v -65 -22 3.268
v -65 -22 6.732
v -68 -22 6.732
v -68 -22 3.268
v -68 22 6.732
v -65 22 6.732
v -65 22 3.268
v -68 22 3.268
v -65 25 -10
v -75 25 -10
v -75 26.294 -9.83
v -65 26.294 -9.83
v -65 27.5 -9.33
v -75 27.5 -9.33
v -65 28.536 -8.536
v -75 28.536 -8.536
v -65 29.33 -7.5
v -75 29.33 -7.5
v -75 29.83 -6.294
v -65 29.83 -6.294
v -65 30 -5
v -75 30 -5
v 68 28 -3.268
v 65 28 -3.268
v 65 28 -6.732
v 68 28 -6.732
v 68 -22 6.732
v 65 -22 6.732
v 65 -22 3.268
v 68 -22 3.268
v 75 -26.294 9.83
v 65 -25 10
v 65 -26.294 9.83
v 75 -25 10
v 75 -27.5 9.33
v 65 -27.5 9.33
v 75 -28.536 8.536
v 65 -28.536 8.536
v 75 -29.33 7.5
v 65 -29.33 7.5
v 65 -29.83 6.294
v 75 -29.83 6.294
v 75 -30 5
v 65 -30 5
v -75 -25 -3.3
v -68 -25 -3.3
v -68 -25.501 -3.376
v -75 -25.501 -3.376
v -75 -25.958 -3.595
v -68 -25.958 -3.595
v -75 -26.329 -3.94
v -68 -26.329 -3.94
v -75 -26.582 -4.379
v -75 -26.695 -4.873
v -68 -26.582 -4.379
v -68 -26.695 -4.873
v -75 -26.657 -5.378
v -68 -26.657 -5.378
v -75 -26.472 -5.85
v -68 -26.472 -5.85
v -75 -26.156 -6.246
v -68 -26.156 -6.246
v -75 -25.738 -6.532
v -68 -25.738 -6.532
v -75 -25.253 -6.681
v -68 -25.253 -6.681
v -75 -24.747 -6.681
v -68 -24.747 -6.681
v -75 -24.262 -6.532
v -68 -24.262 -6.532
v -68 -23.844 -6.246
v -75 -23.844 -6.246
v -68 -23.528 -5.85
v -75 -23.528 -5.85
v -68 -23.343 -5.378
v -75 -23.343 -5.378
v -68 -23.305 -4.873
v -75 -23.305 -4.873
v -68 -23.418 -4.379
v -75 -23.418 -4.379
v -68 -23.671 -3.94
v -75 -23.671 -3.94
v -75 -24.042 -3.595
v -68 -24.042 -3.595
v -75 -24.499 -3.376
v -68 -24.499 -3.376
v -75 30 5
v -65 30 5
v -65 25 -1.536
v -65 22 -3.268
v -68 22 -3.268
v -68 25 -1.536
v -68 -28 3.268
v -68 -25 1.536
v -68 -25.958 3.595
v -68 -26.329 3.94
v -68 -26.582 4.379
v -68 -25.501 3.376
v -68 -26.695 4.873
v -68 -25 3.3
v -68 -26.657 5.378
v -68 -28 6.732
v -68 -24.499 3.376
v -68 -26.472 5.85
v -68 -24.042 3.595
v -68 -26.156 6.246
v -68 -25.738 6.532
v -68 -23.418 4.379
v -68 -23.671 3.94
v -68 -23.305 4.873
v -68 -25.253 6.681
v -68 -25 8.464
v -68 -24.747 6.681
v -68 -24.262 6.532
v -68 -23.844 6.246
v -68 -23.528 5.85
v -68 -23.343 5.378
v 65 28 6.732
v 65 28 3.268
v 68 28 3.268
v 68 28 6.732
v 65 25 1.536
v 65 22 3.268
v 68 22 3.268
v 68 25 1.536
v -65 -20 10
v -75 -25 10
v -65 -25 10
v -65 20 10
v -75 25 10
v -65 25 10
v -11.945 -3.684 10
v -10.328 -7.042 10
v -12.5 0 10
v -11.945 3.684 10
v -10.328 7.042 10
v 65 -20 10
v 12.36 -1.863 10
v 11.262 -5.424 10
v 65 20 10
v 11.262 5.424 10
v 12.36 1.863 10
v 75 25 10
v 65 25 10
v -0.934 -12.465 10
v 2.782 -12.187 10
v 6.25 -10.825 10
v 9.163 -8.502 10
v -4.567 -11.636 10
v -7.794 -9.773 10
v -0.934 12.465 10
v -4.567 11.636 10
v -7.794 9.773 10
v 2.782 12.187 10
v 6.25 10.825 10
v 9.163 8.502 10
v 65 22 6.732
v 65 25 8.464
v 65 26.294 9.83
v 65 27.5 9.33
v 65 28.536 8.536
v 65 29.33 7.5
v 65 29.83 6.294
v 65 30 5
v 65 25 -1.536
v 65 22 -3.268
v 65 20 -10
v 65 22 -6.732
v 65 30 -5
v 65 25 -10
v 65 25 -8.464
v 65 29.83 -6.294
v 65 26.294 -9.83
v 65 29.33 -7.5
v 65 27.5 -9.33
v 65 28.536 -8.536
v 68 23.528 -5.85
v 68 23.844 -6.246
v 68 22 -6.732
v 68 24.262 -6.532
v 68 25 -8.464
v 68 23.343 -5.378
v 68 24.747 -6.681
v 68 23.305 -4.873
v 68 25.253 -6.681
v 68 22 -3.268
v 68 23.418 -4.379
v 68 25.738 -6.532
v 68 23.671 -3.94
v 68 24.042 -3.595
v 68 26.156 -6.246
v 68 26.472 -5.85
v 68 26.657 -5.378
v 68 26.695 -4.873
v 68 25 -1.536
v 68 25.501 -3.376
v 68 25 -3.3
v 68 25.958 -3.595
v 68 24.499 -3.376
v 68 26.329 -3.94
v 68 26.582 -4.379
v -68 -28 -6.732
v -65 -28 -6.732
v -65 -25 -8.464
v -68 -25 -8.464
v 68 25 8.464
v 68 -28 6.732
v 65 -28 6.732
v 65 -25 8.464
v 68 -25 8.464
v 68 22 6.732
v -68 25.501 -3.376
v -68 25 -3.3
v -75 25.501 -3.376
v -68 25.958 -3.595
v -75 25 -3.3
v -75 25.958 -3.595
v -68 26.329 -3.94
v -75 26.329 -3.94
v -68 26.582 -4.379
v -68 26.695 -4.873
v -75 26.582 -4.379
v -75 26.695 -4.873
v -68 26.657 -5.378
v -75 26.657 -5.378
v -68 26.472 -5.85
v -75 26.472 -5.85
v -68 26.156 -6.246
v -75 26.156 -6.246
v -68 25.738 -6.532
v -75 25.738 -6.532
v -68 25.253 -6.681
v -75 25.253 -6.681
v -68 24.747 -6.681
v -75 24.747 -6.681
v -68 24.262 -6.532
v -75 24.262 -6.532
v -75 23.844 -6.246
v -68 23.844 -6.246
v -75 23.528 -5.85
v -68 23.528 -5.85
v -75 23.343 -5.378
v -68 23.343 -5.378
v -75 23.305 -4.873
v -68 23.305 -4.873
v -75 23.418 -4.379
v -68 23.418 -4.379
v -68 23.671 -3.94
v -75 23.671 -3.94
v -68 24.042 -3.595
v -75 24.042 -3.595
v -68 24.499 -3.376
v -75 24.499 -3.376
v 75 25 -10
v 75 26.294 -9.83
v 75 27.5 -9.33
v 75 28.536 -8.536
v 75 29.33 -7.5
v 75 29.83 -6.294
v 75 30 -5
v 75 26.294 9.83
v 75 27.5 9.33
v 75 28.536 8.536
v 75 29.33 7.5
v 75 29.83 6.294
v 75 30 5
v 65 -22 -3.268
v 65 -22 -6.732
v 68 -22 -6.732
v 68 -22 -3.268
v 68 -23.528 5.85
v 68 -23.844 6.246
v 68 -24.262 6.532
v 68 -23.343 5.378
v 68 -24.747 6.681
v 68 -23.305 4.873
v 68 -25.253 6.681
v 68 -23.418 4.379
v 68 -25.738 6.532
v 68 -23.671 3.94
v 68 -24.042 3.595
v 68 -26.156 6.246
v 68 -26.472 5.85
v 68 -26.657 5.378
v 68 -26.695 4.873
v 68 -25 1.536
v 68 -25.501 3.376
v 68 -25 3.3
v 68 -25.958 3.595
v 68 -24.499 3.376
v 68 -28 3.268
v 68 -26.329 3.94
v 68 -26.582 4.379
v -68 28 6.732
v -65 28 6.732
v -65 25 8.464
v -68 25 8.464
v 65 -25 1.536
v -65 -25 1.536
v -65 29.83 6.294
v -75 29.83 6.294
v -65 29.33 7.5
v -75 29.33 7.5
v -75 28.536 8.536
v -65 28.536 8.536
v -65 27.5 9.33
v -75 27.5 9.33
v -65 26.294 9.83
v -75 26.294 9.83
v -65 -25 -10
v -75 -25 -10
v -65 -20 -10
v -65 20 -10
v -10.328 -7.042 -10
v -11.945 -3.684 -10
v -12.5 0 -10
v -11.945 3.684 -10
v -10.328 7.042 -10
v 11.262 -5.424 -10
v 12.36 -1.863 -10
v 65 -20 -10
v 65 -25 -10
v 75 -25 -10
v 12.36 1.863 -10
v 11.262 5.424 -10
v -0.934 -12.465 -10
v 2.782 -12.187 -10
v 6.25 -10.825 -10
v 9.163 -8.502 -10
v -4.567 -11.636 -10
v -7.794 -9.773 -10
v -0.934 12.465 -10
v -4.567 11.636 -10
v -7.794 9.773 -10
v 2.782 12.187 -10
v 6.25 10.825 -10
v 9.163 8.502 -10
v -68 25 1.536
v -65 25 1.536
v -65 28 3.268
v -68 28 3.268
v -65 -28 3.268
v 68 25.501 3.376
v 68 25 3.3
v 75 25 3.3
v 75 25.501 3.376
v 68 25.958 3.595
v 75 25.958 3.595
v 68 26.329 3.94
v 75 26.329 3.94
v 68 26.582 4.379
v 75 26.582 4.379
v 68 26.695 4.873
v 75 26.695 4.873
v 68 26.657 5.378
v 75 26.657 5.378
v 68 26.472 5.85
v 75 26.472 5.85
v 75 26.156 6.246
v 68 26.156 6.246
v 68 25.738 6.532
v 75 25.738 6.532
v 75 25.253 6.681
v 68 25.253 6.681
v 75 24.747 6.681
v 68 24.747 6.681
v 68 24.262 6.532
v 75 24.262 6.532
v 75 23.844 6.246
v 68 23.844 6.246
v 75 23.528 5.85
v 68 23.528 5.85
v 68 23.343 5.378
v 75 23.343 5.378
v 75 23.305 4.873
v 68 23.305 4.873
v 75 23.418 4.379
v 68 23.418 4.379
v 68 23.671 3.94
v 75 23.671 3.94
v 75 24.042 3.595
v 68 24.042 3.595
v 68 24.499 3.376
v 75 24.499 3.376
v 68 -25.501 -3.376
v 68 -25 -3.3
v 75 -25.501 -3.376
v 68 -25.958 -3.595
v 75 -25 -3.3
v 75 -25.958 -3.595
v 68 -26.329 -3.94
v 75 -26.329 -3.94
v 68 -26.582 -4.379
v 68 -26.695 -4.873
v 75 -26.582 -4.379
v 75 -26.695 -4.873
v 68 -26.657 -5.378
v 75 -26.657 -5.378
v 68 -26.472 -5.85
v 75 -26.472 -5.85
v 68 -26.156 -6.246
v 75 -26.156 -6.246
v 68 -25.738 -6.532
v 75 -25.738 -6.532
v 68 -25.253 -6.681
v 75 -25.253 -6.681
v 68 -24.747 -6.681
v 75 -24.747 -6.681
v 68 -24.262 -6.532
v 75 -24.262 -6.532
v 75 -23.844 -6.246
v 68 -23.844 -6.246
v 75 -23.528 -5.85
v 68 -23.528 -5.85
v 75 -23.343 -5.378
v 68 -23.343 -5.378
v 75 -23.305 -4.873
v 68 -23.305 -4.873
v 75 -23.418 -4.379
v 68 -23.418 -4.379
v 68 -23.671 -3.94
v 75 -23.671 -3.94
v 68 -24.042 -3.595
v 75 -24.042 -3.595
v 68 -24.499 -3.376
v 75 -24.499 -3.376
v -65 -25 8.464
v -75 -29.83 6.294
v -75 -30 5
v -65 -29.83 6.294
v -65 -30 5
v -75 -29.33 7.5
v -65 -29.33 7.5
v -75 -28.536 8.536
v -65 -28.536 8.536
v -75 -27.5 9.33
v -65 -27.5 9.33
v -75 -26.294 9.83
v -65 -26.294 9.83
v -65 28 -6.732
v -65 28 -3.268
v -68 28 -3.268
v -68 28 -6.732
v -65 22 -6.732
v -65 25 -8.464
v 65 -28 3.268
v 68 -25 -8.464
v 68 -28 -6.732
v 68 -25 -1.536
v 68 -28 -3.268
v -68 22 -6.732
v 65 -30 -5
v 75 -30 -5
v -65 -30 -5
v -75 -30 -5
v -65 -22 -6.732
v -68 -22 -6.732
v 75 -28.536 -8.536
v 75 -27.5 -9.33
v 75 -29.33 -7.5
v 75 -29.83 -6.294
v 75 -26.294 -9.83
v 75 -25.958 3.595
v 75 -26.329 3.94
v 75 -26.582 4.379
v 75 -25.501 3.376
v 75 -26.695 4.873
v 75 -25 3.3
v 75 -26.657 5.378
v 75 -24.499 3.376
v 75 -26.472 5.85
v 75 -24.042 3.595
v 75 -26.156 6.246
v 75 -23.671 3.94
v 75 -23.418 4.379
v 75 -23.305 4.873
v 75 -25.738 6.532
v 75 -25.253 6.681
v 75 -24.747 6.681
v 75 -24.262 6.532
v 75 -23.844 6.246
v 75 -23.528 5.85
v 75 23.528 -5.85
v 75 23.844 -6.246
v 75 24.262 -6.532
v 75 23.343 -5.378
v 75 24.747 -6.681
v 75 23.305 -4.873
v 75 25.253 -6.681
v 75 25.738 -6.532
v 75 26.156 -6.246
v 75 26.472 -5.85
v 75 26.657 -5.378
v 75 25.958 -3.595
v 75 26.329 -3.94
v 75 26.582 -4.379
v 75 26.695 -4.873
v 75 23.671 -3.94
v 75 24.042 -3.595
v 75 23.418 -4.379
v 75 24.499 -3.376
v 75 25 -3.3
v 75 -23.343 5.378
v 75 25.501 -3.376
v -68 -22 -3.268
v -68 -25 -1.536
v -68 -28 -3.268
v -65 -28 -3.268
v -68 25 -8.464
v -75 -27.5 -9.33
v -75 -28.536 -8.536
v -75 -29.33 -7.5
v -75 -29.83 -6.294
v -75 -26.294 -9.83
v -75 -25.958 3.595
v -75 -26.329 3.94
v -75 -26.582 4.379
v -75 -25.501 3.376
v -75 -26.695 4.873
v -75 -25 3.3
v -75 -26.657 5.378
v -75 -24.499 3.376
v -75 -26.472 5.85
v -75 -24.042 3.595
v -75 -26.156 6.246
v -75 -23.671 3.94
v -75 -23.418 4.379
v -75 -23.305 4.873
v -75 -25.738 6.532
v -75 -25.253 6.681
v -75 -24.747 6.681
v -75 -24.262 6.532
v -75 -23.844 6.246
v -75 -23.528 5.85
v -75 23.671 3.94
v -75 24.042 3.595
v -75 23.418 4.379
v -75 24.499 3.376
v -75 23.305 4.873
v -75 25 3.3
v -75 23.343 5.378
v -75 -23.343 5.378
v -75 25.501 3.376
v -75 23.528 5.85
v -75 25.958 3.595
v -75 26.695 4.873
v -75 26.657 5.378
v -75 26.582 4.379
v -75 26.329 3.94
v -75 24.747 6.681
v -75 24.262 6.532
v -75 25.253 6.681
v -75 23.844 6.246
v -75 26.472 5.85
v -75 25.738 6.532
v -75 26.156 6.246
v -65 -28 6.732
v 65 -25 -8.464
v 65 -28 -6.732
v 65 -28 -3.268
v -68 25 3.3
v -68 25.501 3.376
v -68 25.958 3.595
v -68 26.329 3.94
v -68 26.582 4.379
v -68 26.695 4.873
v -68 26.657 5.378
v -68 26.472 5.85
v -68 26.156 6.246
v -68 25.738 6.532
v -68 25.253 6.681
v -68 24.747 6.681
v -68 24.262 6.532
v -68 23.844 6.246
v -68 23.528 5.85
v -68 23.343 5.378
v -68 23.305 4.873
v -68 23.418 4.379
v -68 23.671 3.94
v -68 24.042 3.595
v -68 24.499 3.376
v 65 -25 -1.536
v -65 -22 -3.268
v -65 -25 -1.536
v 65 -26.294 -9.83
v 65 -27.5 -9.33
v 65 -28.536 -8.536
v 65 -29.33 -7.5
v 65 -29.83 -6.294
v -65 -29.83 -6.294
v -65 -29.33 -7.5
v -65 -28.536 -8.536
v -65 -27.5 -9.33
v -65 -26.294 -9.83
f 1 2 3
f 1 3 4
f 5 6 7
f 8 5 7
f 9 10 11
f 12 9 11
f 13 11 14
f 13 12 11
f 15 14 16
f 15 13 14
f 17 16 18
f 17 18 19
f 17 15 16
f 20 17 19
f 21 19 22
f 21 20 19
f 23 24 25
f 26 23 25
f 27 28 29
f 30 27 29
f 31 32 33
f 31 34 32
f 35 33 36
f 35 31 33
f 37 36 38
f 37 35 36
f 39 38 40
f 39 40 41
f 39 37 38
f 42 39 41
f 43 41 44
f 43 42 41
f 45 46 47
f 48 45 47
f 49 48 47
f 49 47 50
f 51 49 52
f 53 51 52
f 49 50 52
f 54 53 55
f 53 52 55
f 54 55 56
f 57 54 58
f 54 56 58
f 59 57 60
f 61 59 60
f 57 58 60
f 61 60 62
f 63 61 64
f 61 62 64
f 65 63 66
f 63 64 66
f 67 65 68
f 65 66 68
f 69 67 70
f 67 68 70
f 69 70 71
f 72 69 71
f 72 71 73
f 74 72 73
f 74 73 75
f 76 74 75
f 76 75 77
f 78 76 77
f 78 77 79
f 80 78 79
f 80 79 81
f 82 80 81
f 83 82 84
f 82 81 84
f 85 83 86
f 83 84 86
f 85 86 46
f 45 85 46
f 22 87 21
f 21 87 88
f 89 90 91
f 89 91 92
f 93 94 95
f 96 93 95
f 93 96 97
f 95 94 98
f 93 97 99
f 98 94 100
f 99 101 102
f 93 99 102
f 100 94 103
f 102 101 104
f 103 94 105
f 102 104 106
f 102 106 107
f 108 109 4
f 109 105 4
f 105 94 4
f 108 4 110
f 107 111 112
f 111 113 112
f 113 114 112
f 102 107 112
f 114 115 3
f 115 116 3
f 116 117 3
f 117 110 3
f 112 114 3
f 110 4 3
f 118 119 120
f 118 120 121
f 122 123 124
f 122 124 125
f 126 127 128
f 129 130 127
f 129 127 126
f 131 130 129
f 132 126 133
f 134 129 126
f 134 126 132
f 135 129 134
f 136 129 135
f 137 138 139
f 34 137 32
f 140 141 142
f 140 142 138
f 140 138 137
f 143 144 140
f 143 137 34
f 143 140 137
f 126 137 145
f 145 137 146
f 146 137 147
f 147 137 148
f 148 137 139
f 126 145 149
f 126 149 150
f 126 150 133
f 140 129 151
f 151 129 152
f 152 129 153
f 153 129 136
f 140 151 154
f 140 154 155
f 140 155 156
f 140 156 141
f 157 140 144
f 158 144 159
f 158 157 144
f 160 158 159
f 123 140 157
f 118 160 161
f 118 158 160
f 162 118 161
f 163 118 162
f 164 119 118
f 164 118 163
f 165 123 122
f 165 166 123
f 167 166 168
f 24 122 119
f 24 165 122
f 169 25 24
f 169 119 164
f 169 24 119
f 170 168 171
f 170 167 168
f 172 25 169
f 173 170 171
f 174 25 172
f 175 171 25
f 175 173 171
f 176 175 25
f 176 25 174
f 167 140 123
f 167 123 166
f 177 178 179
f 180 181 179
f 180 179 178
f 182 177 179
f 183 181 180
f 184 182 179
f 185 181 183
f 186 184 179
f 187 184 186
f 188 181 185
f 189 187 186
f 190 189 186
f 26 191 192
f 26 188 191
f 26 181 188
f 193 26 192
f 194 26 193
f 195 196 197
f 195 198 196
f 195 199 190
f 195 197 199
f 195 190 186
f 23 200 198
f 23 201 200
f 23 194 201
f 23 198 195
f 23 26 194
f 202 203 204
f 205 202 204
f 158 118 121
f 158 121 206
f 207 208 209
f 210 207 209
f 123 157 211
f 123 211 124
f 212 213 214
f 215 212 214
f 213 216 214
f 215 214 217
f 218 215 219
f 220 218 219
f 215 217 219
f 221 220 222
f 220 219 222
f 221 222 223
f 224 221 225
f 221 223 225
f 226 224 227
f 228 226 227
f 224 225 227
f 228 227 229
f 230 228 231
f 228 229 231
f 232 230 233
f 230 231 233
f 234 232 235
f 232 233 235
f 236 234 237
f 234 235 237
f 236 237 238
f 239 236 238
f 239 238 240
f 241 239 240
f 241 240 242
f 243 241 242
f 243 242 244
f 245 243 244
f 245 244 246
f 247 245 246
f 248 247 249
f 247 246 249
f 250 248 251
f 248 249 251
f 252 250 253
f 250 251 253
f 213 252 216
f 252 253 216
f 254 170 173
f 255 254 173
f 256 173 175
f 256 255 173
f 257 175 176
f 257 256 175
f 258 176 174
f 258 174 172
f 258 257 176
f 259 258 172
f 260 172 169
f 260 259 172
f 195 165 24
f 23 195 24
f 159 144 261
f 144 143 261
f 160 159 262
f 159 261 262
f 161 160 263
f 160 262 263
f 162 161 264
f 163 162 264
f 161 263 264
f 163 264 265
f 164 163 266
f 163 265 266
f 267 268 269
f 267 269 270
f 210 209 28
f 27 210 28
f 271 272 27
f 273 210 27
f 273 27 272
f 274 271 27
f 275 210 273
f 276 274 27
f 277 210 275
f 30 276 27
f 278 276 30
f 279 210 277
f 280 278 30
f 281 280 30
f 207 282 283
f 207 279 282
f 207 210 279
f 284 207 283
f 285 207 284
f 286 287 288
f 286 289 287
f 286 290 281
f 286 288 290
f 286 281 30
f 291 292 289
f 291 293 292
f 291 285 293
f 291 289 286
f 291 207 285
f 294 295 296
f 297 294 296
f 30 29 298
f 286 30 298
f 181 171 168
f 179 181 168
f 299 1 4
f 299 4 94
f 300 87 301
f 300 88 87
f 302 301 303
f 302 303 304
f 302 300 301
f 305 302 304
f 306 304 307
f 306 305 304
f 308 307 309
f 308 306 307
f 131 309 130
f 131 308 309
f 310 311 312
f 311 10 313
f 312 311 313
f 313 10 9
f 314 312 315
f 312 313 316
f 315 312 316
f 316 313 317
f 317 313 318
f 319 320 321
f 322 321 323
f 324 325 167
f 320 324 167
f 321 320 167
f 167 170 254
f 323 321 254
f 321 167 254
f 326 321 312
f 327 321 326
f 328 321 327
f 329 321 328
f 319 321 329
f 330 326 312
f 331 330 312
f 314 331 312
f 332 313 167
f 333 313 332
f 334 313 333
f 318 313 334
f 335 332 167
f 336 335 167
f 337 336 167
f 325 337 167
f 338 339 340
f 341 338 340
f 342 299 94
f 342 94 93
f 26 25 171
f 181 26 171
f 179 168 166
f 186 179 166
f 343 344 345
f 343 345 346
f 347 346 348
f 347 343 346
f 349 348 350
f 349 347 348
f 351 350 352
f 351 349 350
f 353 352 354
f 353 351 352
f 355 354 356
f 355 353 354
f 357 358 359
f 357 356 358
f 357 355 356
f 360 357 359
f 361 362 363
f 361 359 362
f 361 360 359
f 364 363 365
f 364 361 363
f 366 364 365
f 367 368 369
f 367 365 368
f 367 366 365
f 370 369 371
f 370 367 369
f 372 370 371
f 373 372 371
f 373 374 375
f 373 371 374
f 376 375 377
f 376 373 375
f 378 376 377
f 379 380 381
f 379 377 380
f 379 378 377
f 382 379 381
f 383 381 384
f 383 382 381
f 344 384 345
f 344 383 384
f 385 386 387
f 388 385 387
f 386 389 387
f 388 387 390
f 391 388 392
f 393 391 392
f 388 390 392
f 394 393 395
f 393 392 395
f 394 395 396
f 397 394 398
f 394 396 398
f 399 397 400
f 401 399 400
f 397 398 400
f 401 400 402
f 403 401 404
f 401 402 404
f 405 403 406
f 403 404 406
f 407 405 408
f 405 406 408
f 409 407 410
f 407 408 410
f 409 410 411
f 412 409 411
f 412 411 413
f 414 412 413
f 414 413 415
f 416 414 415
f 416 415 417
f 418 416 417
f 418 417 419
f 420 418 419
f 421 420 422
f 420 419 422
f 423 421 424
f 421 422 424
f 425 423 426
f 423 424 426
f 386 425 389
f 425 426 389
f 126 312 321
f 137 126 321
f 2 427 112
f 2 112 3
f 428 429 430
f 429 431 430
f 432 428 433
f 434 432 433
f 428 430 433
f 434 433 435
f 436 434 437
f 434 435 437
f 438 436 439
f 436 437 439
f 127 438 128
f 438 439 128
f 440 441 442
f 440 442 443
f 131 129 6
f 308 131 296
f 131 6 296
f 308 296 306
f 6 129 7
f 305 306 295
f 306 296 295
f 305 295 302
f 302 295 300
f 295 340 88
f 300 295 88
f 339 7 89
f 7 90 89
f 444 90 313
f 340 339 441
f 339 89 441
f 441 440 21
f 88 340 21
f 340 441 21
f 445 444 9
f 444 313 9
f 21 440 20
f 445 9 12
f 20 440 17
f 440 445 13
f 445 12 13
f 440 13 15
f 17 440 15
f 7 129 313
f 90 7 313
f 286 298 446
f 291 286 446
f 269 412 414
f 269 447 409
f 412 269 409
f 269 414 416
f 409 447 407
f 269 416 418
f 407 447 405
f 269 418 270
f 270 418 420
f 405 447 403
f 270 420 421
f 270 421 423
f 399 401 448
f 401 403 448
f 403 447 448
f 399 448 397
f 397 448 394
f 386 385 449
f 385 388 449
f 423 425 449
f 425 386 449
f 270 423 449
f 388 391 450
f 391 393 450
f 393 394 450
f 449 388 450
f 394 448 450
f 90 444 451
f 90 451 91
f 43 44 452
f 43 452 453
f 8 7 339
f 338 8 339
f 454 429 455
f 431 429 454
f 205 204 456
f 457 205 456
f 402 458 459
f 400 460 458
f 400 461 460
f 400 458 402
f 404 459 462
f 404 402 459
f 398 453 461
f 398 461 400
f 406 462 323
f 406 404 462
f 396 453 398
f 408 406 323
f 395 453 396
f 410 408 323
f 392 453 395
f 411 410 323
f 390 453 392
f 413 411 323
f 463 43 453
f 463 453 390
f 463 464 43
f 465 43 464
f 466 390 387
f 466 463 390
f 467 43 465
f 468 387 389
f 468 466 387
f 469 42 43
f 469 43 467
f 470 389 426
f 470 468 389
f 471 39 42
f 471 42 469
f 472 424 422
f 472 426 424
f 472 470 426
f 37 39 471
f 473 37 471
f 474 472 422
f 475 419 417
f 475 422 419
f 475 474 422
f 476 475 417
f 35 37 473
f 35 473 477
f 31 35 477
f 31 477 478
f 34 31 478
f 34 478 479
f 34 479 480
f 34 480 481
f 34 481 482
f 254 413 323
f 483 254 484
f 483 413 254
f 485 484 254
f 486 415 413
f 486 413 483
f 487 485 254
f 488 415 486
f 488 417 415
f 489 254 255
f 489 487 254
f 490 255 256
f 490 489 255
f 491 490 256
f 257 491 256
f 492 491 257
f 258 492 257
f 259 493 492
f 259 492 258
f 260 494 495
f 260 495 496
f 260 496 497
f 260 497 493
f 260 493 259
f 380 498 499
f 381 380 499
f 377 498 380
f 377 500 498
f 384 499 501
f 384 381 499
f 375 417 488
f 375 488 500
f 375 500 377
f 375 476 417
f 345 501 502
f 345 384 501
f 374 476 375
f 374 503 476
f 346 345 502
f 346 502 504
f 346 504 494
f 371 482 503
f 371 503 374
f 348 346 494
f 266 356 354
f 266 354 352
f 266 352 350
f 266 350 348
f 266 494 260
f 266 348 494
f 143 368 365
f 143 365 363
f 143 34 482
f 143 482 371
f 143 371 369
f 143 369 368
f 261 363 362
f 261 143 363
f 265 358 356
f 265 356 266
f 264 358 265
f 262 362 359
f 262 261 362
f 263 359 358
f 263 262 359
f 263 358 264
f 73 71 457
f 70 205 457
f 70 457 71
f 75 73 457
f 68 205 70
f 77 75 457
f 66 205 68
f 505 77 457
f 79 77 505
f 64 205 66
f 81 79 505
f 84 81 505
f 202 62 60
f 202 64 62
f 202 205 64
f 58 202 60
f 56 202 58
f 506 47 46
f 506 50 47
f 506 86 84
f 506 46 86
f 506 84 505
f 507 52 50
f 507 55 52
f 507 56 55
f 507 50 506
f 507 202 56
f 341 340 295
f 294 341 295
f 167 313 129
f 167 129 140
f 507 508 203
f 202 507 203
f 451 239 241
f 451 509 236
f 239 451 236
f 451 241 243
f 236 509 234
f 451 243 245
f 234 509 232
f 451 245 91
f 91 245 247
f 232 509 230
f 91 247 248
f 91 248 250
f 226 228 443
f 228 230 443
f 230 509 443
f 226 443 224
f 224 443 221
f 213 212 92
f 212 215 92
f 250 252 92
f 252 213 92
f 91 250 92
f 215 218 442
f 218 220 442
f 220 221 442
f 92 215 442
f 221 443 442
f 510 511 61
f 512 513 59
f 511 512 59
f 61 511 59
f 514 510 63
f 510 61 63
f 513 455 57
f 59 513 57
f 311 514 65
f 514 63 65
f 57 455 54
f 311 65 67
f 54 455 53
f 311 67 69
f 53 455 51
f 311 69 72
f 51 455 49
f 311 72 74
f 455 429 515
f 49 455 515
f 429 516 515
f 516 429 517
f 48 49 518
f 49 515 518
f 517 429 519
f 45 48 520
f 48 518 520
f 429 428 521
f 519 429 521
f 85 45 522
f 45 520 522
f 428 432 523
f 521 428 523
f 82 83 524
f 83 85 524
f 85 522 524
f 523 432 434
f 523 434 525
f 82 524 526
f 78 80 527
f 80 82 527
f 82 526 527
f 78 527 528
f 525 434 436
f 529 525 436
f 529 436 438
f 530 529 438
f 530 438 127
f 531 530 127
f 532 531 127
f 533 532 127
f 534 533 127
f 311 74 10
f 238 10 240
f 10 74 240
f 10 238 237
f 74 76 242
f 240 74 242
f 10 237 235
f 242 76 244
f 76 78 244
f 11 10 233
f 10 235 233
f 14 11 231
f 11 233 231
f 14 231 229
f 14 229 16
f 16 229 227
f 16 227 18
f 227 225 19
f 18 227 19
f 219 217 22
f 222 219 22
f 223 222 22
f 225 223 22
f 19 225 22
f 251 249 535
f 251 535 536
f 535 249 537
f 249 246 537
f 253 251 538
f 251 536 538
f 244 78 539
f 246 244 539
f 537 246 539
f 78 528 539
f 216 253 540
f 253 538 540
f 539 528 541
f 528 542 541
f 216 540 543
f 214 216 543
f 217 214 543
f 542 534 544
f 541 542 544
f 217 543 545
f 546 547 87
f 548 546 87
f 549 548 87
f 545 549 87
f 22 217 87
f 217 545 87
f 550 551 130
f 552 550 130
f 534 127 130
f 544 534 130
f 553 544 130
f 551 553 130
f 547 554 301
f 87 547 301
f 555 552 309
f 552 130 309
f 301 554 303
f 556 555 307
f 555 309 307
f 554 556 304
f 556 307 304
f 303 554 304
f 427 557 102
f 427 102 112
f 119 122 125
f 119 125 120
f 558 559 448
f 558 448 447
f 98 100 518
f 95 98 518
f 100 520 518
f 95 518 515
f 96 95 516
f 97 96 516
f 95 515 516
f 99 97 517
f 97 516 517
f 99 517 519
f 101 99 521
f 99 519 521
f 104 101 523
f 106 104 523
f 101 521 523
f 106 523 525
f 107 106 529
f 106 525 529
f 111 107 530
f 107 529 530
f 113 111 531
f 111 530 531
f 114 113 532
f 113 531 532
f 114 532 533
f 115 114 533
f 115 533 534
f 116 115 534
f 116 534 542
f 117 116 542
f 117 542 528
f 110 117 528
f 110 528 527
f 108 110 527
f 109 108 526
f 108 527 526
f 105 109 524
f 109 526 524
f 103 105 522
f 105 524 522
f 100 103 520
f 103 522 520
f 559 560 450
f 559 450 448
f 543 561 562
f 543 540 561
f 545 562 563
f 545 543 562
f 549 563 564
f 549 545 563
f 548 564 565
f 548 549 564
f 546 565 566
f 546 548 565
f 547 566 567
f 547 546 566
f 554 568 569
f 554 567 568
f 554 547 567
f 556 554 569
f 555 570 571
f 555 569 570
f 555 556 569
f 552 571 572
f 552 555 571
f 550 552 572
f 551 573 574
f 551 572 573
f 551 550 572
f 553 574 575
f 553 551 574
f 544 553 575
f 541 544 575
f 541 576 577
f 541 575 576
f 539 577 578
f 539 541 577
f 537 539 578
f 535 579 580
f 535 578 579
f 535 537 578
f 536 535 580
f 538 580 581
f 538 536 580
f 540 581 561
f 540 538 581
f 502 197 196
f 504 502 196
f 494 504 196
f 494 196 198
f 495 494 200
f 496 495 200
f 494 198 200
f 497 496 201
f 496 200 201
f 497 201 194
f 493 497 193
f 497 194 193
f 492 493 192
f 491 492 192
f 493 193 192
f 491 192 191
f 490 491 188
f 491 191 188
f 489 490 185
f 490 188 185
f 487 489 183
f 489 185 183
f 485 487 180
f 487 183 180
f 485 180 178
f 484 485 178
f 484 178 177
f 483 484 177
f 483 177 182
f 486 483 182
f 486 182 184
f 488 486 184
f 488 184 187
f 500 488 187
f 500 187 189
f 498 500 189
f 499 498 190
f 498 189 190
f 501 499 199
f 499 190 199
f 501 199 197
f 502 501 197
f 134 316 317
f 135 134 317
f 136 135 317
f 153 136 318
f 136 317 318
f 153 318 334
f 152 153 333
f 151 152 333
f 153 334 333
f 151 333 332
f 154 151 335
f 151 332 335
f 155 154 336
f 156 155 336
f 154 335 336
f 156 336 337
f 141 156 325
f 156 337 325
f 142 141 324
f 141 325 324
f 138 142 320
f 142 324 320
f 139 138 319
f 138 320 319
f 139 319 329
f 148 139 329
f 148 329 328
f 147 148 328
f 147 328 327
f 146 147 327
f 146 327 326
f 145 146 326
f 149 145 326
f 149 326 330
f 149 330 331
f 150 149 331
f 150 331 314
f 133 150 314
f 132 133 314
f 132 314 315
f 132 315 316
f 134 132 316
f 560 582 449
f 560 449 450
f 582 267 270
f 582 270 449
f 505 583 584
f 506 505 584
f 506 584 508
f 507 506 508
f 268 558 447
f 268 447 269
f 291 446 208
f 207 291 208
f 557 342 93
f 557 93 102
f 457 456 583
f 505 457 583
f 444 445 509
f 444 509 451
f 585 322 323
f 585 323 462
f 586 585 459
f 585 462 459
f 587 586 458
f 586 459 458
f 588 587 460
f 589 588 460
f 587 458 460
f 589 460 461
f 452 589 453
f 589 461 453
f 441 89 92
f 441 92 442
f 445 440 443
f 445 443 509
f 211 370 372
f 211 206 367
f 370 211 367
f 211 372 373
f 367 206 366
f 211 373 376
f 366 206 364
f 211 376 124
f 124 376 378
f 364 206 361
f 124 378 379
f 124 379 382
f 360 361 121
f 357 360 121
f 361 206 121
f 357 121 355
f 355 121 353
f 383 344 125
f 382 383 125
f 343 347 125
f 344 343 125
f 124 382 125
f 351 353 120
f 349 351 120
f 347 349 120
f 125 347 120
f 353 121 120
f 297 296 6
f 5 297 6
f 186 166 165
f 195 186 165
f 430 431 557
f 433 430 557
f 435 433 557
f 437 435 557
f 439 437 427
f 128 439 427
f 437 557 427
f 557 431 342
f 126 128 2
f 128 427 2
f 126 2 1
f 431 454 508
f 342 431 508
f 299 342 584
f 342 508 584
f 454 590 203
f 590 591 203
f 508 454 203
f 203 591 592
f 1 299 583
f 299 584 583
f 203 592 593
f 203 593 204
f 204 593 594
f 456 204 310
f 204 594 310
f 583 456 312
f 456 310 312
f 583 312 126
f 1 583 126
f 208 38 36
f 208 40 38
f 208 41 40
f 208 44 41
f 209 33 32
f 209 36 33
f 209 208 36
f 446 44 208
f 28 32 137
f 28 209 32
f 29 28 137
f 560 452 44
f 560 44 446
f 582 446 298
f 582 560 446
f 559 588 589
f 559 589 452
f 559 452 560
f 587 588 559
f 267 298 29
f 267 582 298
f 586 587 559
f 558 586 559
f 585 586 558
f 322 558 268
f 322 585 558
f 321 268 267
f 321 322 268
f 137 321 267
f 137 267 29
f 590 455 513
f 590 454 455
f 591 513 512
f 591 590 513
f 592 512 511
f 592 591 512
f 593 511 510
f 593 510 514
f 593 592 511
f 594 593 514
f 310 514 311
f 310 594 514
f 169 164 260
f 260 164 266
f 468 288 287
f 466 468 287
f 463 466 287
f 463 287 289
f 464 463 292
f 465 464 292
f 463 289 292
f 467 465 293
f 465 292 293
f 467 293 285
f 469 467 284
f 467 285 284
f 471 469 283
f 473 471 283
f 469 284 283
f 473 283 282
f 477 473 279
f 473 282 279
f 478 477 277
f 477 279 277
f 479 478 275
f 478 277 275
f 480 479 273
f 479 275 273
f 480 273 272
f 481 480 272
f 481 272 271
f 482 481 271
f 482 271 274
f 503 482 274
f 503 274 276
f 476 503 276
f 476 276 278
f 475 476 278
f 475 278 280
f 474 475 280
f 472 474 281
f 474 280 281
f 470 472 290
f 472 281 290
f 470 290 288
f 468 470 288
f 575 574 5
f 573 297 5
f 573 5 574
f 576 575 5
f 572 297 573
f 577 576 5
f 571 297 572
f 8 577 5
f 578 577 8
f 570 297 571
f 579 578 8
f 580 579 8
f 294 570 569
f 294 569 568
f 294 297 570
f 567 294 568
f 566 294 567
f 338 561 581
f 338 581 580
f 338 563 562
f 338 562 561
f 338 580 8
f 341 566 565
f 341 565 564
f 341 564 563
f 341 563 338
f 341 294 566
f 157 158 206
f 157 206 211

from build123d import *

# Parameters (mm, degrees)
SKETCH1_W                                  = 150
SKETCH1_H                                  = 60
BOSS_EXTRUDE1_DEPTH                        = 10
CUT_EXTRUDE1_DEPTH                         = 84.216584885
CUT_EXTRUDE1_DEPTH_BACK                    = 84.216584885
SKETCH2_W                                  = 130
SKETCH2_H                                  = 10
FILLET1_R                                  = 5
SKETCH4_R                                  = 1.7
CUT_EXTRUDE3_DEPTH                         = 144.527000944
CUT_EXTRUDE4_DEPTH                         = 3
MIRROR1_AT_THE_SECOND_PLANE_COPY_1_SKETC_R = 1.7
MIRROR1_AT_THE_SECOND_PLANE_COPY_1_DEPTH   = 144.527000944
MIRROR1_AT_THE_SECOND_PLANE_COPY_2_DEPTH   = 3
MIRROR2_COPY_1_SKETCH_R                    = 1.7
MIRROR2_COPY_1_DEPTH                       = 144.527000944
MIRROR2_COPY_2_DEPTH                       = 3
MIRROR2_COPY_3_SKETCH_R                    = 1.7
MIRROR2_COPY_3_DEPTH                       = 144.527000944
MIRROR2_COPY_4_DEPTH                       = 3
MIRROR2_COPY_5_SKETCH_R                    = 1.7
MIRROR2_COPY_5_DEPTH                       = 144.527000944
MIRROR2_COPY_6_DEPTH                       = 3
MIRROR2_COPY_7_SKETCH_R                    = 1.7
MIRROR2_COPY_7_DEPTH                       = 144.527000944
SKETCH6_R                                  = 12.5
CUT_EXTRUDE5_DEPTH                         = 84.216584885


with BuildPart() as part:
    # Sketch1 → Boss-Extrude1 (new, symmetric)
    with BuildSketch(Plane.XY):
        Rectangle(SKETCH1_W, SKETCH1_H)
    extrude(amount=BOSS_EXTRUDE1_DEPTH, both=True)

    # Sketch2 → Cut-Extrude1 (cut, two sides: drawn at the far end of the back side and taken through both)
    with BuildSketch(Plane.XY.offset(10).offset(-CUT_EXTRUDE1_DEPTH_BACK)):
        with Locations((0, -25)):
            Rectangle(SKETCH2_W, SKETCH2_H)
        with Locations((0, 25)):
            Rectangle(SKETCH2_W, SKETCH2_H)
    extrude(amount=CUT_EXTRUDE1_DEPTH + CUT_EXTRUDE1_DEPTH_BACK, mode=Mode.SUBTRACT)

    # Fillet1
    fillet1_edges = [part.edges().sort_by_distance(p)[0] for p in [
        (70, -30, -10),
        (-70, 30, -10),
        (-70, -30, 10),
        (-70, 30, 10),
        (70, -30, 10),
        (-70, -30, -10),
        (70, 30, -10),
        (70, 30, 10),
    ]]
    fillet(fillet1_edges, radius=FILLET1_R)

    # Sketch4 → Cut-Extrude3 (cut, symmetric)
    with BuildSketch(Plane.ZY.offset(-65)):
        with Locations((-5, 25)):
            Circle(SKETCH4_R)
    cut_extrude3 = extrude(amount=CUT_EXTRUDE3_DEPTH, both=True, mode=Mode.SUBTRACT)

    # Sketch5 → Cut-Extrude4 (cut)
    with BuildSketch(Plane.ZY.offset(-65)):
        Polygon((-8.464101615, 25), (-6.732050808, 22), (-3.267949192, 22), (-1.535898385, 25), (-3.267949192, 28), (-6.732050808, 28), align=None)
    cut_extrude4 = extrude(amount=-CUT_EXTRUDE4_DEPTH, mode=Mode.SUBTRACT)

    # Mirror1: Cut-Extrude3, Cut-Extrude4 across plane
    add(cut_extrude3.mirror(Plane(origin=(0, 0, 0), x_dir=(0, 0, 1), z_dir=(1, 0, 0))), mode=Mode.SUBTRACT)
    add(cut_extrude4.mirror(Plane(origin=(0, 0, 0), x_dir=(0, 0, 1), z_dir=(1, 0, 0))), mode=Mode.SUBTRACT)

    # Mirror1 at the second plane: Cut-Extrude3, Cut-Extrude4 across plane
    add(cut_extrude3.mirror(Plane.XY), mode=Mode.SUBTRACT)
    add(cut_extrude4.mirror(Plane.XY), mode=Mode.SUBTRACT)

    # Mirror1 at the second plane copy 1 sketc → Mirror1 at the second plane copy 1 (cut, symmetric)
    with BuildSketch(Plane(origin=(-65, 0, 0), x_dir=(0, 0, -1), z_dir=(1, 0, 0))):
        with Locations((-5, 25)):
            Circle(MIRROR1_AT_THE_SECOND_PLANE_COPY_1_SKETC_R)
    extrude(amount=MIRROR1_AT_THE_SECOND_PLANE_COPY_1_DEPTH, both=True, mode=Mode.SUBTRACT)

    # Mirror1 at the second plane copy 2 sketc → Mirror1 at the second plane copy 2 (cut)
    with BuildSketch(Plane(origin=(-65, 0, 0), x_dir=(0, 0, -1), z_dir=(1, 0, 0))):
        Polygon((-8.464101615, 25), (-6.732050808, 22), (-3.267949192, 22), (-1.535898385, 25), (-3.267949192, 28), (-6.732050808, 28), align=None)
    extrude(amount=-MIRROR1_AT_THE_SECOND_PLANE_COPY_2_DEPTH, mode=Mode.SUBTRACT)

    # Mirror2: Cut-Extrude4 across plane
    add(cut_extrude4.mirror(Plane.ZX), mode=Mode.SUBTRACT)

    # Mirror2 copy 1 sketch → Mirror2 copy 1 (cut, symmetric)
    with BuildSketch(Plane(origin=(-65, 0, 0), x_dir=(0, 0, 1), z_dir=(1, 0, 0))):
        with Locations((-5, 25)):
            Circle(MIRROR2_COPY_1_SKETCH_R)
    extrude(amount=MIRROR2_COPY_1_DEPTH, both=True, mode=Mode.SUBTRACT)

    # Mirror2 copy 2 sketch → Mirror2 copy 2 (cut)
    with BuildSketch(Plane(origin=(-65, 0, 0), x_dir=(0, 0, 1), z_dir=(1, 0, 0))):
        Polygon((-8.464101615, 25), (-6.732050808, 22), (-3.267949192, 22), (-1.535898385, 25), (-3.267949192, 28), (-6.732050808, 28), align=None)
    extrude(amount=-MIRROR2_COPY_2_DEPTH, mode=Mode.SUBTRACT)

    # Mirror2 copy 3 sketch → Mirror2 copy 3 (cut, symmetric)
    with BuildSketch(Plane(origin=(65, 0, 0), x_dir=(0, 0, -1), z_dir=(-1, 0, 0))):
        with Locations((-5, 25)):
            Circle(MIRROR2_COPY_3_SKETCH_R)
    extrude(amount=MIRROR2_COPY_3_DEPTH, both=True, mode=Mode.SUBTRACT)

    # Mirror2 copy 4 sketch → Mirror2 copy 4 (cut)
    with BuildSketch(Plane(origin=(65, 0, 0), x_dir=(0, 0, -1), z_dir=(-1, 0, 0))):
        Polygon((-8.464101615, 25), (-6.732050808, 22), (-3.267949192, 22), (-1.535898385, 25), (-3.267949192, 28), (-6.732050808, 28), align=None)
    extrude(amount=-MIRROR2_COPY_4_DEPTH, mode=Mode.SUBTRACT)

    # Mirror2 copy 5 sketch → Mirror2 copy 5 (cut, symmetric)
    with BuildSketch(Plane(origin=(-65, 0, 0), x_dir=(0, 0, -1), z_dir=(1, 0, 0))):
        with Locations((-5, -25)):
            Circle(MIRROR2_COPY_5_SKETCH_R)
    extrude(amount=MIRROR2_COPY_5_DEPTH, both=True, mode=Mode.SUBTRACT)

    # Mirror2 copy 6 sketch → Mirror2 copy 6 (cut)
    with BuildSketch(Plane(origin=(-65, 0, 0), x_dir=(0, 0, -1), z_dir=(1, 0, 0))):
        Polygon((-8.464101615, -25), (-6.732050808, -22), (-3.267949192, -22), (-1.535898385, -25), (-3.267949192, -28), (-6.732050808, -28), align=None)
    extrude(amount=-MIRROR2_COPY_6_DEPTH, mode=Mode.SUBTRACT)

    # Mirror2 copy 7 sketch → Mirror2 copy 7 (cut, symmetric)
    with BuildSketch(Plane.ZY.offset(-65)):
        with Locations((-5, -25)):
            Circle(MIRROR2_COPY_7_SKETCH_R)
    extrude(amount=MIRROR2_COPY_7_DEPTH, both=True, mode=Mode.SUBTRACT)

    # Sketch6 → Cut-Extrude5 (cut, through all)
    with BuildSketch(Plane(origin=(0, 0, -10), x_dir=(-1, 0, 0), z_dir=(0, 0, -1))):
        Circle(SKETCH6_R)
    extrude(amount=-CUT_EXTRUDE5_DEPTH, mode=Mode.SUBTRACT)


solid = part.part
